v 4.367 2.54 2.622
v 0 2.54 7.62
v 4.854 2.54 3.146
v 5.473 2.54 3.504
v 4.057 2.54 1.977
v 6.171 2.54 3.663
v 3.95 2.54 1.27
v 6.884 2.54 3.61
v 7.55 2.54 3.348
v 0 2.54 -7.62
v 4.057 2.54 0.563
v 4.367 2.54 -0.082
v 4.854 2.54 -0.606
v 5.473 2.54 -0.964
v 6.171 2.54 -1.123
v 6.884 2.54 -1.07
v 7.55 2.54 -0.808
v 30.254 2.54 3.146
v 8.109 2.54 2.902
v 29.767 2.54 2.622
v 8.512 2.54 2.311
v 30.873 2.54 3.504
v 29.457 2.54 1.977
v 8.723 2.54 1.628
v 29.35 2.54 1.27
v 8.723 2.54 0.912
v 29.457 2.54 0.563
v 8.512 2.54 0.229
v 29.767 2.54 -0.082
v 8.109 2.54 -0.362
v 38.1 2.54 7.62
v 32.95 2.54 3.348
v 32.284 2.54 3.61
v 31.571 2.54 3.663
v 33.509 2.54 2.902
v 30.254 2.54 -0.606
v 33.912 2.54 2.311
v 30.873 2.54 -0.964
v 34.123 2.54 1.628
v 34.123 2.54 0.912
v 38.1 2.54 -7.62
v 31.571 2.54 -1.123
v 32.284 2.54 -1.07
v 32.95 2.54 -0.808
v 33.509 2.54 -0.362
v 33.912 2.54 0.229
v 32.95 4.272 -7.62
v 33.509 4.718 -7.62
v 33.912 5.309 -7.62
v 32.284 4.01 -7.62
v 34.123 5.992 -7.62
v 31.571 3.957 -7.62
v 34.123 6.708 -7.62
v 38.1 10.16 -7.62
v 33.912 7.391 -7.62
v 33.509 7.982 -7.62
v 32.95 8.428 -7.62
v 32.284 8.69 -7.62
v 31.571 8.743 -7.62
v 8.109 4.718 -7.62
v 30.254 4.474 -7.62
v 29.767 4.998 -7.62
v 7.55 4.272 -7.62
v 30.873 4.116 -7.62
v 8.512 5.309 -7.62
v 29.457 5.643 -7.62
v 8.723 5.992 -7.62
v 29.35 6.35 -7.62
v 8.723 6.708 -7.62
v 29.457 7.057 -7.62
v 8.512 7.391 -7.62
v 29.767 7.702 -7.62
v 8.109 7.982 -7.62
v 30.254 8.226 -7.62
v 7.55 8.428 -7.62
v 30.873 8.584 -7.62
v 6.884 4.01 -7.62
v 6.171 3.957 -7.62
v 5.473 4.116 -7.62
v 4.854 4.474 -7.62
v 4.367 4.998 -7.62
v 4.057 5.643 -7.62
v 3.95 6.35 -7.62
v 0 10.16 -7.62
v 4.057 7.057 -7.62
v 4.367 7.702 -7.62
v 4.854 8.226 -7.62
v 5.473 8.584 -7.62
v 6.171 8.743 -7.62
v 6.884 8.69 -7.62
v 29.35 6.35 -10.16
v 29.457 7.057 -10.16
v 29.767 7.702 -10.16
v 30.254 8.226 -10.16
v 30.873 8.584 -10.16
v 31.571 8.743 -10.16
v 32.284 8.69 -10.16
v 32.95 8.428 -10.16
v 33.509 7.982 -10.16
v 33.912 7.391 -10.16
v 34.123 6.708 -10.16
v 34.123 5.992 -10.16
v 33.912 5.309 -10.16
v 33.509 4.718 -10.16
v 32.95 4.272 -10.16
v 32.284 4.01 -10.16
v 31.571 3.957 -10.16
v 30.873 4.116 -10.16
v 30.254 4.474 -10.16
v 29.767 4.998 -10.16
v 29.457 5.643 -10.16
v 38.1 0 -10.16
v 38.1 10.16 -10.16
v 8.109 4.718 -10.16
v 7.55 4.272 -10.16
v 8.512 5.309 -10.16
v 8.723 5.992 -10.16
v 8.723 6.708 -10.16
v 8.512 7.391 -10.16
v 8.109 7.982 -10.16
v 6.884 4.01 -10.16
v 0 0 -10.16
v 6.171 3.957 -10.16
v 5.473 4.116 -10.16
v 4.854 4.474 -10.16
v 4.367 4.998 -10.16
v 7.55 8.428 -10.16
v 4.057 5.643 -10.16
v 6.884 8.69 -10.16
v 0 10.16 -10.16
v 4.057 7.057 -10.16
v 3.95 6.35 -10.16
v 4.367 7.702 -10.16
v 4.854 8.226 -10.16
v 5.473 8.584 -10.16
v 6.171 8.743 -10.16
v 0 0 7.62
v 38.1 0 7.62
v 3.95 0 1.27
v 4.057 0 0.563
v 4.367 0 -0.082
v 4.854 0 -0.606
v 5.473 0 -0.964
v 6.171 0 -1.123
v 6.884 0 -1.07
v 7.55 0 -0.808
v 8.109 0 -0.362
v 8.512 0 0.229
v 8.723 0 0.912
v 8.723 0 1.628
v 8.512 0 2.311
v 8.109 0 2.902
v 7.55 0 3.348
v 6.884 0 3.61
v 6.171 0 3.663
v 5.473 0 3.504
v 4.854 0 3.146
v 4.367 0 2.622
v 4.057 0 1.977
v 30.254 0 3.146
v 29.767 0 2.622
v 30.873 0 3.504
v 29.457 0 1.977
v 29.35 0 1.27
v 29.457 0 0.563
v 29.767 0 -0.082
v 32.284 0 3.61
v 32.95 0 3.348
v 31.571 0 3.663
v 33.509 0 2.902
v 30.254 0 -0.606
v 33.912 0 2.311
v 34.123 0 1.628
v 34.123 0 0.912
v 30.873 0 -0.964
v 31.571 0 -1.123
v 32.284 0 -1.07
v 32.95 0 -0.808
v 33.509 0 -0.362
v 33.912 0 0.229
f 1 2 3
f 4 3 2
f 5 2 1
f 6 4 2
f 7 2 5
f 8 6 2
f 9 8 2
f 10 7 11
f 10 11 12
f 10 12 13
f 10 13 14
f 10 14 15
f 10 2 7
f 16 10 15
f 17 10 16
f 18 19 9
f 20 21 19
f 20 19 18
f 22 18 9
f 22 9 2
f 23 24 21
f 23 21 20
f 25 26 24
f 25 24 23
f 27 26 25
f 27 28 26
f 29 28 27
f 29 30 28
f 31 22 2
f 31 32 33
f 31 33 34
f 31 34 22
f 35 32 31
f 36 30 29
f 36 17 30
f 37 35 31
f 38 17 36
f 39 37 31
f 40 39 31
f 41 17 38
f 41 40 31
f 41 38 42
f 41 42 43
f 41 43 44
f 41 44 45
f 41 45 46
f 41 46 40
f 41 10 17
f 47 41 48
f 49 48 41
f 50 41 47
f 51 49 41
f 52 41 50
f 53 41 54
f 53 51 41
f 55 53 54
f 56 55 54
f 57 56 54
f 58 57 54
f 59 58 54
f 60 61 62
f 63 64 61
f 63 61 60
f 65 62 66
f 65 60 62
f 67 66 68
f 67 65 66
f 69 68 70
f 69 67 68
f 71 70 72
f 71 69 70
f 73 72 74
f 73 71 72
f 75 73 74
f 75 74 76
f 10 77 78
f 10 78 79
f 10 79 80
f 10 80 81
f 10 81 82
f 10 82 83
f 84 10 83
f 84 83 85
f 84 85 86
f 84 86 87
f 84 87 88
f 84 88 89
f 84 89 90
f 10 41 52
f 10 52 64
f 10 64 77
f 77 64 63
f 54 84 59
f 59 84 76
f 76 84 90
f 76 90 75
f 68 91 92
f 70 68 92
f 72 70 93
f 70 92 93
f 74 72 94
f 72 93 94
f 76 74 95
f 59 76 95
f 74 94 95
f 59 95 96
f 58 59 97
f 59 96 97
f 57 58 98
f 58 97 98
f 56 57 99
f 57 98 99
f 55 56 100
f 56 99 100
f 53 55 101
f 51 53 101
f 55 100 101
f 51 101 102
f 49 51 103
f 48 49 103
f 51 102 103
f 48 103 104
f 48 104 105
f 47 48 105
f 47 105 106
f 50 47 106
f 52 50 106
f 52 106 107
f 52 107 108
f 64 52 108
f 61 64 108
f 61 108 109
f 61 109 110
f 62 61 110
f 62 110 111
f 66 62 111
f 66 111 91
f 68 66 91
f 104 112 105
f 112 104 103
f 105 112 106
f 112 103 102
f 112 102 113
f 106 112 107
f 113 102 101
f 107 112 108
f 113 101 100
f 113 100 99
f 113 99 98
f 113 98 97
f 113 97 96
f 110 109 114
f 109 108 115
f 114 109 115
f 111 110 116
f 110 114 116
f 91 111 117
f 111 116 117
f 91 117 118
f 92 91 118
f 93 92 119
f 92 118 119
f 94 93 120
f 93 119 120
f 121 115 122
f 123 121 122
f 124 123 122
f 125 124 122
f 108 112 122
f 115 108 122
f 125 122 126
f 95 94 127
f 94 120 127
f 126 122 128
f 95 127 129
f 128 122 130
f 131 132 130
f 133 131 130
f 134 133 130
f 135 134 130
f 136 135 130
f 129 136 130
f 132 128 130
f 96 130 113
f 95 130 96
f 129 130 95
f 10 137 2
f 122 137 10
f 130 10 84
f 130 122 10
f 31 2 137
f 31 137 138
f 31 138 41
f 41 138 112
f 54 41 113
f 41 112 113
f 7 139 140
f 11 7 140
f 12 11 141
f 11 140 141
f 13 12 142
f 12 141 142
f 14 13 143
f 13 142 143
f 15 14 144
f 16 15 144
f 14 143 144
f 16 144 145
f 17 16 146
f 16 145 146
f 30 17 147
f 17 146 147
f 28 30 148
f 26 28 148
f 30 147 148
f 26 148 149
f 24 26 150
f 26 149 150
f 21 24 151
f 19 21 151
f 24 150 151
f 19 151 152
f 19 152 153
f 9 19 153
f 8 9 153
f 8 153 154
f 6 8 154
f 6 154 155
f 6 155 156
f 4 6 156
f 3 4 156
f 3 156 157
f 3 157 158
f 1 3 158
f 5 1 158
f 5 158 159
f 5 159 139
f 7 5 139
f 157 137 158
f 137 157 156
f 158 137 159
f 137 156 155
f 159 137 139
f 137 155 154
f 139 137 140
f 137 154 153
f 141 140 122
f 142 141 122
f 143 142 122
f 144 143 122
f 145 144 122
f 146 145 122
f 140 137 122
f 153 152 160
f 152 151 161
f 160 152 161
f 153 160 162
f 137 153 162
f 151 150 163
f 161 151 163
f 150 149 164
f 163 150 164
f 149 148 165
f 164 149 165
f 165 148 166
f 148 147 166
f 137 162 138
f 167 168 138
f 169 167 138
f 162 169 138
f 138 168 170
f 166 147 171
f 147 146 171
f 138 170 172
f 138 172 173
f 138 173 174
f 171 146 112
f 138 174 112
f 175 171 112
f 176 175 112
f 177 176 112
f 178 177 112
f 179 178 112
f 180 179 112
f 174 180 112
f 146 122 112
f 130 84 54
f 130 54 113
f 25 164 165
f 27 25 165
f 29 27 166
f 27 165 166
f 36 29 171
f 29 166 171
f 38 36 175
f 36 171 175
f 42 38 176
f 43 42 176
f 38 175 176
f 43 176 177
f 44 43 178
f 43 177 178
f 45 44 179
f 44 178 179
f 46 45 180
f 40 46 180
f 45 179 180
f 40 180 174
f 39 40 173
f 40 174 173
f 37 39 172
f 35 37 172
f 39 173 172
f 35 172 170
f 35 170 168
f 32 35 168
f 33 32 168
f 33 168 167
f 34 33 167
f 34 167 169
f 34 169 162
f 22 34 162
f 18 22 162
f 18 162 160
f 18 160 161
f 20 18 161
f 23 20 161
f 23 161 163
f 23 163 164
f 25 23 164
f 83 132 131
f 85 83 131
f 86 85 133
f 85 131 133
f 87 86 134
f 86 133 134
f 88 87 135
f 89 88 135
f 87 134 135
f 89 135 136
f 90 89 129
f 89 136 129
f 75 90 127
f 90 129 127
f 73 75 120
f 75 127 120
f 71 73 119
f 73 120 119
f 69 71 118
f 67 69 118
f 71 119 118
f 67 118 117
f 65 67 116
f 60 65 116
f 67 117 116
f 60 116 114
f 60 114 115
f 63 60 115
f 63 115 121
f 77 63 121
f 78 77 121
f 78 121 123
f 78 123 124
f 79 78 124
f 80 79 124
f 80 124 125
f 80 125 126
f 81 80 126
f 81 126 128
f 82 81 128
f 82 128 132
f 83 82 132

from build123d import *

# Parameters (mm, degrees)
SKETCH2_W               = 10.16
SKETCH2_H               = 10.16
BOSS_EXTRUDE1_DEPTH     = 38.1
CUT_EXTRUDE1_DEPTH      = 41.719297636
CUT_EXTRUDE1_DEPTH_BACK = 38.1
SKETCH3_W               = 7.62
SKETCH3_H               = 7.62
M4_CLEARANCE_HOLE2_D    = 4.8
SKETCH13_W              = 38.1
SKETCH13_H              = 2.54
BOSS_EXTRUDE2_DEPTH     = 7.62
M4_CLEARANCE_HOLE3_D    = 4.8


with BuildPart() as part:
    # Sketch2 → Boss-Extrude1 (new body)
    with BuildSketch(Plane(origin=(0, 0, 0), x_dir=(0, 0, -1), z_dir=(1, 0, 0))):
        with Locations((5.08, 5.08)):
            Rectangle(SKETCH2_W, SKETCH2_H)
    extrude(amount=BOSS_EXTRUDE1_DEPTH)

    # Sketch3 → Cut-Extrude1 (cut, two sides: drawn at the far end of the back side and taken through both)
    with BuildSketch(Plane(origin=(38.1, 0, 0), x_dir=(0, 0, -1), z_dir=(1, 0, 0)).offset(-CUT_EXTRUDE1_DEPTH_BACK)):
        with Locations((3.81, 6.35)):
            Rectangle(SKETCH3_W, SKETCH3_H)
    extrude(amount=CUT_EXTRUDE1_DEPTH + CUT_EXTRUDE1_DEPTH_BACK, mode=Mode.SUBTRACT)

    # M4 Clearance Hole2 (through all)
    with Locations(Plane.XY.offset(-7.62)):
        with Locations((6.35, 6.35), (31.75, 6.35)):
            Hole(M4_CLEARANCE_HOLE2_D / 2)

    # Sketch13 → Boss-Extrude2 (add)
    with BuildSketch(Plane.XY):
        with Locations((19.05, 1.27)):
            Rectangle(SKETCH13_W, SKETCH13_H)
    extrude(amount=BOSS_EXTRUDE2_DEPTH)

    # M4 Clearance Hole3 (through all)
    with Locations(Plane(origin=(0, 2.54, 0), x_dir=(1, 0, 0), z_dir=(0, 1, 0))):
        with Locations((6.35, -1.27), (31.75, -1.27)):
            Hole(M4_CLEARANCE_HOLE3_D / 2)


solid = part.part
